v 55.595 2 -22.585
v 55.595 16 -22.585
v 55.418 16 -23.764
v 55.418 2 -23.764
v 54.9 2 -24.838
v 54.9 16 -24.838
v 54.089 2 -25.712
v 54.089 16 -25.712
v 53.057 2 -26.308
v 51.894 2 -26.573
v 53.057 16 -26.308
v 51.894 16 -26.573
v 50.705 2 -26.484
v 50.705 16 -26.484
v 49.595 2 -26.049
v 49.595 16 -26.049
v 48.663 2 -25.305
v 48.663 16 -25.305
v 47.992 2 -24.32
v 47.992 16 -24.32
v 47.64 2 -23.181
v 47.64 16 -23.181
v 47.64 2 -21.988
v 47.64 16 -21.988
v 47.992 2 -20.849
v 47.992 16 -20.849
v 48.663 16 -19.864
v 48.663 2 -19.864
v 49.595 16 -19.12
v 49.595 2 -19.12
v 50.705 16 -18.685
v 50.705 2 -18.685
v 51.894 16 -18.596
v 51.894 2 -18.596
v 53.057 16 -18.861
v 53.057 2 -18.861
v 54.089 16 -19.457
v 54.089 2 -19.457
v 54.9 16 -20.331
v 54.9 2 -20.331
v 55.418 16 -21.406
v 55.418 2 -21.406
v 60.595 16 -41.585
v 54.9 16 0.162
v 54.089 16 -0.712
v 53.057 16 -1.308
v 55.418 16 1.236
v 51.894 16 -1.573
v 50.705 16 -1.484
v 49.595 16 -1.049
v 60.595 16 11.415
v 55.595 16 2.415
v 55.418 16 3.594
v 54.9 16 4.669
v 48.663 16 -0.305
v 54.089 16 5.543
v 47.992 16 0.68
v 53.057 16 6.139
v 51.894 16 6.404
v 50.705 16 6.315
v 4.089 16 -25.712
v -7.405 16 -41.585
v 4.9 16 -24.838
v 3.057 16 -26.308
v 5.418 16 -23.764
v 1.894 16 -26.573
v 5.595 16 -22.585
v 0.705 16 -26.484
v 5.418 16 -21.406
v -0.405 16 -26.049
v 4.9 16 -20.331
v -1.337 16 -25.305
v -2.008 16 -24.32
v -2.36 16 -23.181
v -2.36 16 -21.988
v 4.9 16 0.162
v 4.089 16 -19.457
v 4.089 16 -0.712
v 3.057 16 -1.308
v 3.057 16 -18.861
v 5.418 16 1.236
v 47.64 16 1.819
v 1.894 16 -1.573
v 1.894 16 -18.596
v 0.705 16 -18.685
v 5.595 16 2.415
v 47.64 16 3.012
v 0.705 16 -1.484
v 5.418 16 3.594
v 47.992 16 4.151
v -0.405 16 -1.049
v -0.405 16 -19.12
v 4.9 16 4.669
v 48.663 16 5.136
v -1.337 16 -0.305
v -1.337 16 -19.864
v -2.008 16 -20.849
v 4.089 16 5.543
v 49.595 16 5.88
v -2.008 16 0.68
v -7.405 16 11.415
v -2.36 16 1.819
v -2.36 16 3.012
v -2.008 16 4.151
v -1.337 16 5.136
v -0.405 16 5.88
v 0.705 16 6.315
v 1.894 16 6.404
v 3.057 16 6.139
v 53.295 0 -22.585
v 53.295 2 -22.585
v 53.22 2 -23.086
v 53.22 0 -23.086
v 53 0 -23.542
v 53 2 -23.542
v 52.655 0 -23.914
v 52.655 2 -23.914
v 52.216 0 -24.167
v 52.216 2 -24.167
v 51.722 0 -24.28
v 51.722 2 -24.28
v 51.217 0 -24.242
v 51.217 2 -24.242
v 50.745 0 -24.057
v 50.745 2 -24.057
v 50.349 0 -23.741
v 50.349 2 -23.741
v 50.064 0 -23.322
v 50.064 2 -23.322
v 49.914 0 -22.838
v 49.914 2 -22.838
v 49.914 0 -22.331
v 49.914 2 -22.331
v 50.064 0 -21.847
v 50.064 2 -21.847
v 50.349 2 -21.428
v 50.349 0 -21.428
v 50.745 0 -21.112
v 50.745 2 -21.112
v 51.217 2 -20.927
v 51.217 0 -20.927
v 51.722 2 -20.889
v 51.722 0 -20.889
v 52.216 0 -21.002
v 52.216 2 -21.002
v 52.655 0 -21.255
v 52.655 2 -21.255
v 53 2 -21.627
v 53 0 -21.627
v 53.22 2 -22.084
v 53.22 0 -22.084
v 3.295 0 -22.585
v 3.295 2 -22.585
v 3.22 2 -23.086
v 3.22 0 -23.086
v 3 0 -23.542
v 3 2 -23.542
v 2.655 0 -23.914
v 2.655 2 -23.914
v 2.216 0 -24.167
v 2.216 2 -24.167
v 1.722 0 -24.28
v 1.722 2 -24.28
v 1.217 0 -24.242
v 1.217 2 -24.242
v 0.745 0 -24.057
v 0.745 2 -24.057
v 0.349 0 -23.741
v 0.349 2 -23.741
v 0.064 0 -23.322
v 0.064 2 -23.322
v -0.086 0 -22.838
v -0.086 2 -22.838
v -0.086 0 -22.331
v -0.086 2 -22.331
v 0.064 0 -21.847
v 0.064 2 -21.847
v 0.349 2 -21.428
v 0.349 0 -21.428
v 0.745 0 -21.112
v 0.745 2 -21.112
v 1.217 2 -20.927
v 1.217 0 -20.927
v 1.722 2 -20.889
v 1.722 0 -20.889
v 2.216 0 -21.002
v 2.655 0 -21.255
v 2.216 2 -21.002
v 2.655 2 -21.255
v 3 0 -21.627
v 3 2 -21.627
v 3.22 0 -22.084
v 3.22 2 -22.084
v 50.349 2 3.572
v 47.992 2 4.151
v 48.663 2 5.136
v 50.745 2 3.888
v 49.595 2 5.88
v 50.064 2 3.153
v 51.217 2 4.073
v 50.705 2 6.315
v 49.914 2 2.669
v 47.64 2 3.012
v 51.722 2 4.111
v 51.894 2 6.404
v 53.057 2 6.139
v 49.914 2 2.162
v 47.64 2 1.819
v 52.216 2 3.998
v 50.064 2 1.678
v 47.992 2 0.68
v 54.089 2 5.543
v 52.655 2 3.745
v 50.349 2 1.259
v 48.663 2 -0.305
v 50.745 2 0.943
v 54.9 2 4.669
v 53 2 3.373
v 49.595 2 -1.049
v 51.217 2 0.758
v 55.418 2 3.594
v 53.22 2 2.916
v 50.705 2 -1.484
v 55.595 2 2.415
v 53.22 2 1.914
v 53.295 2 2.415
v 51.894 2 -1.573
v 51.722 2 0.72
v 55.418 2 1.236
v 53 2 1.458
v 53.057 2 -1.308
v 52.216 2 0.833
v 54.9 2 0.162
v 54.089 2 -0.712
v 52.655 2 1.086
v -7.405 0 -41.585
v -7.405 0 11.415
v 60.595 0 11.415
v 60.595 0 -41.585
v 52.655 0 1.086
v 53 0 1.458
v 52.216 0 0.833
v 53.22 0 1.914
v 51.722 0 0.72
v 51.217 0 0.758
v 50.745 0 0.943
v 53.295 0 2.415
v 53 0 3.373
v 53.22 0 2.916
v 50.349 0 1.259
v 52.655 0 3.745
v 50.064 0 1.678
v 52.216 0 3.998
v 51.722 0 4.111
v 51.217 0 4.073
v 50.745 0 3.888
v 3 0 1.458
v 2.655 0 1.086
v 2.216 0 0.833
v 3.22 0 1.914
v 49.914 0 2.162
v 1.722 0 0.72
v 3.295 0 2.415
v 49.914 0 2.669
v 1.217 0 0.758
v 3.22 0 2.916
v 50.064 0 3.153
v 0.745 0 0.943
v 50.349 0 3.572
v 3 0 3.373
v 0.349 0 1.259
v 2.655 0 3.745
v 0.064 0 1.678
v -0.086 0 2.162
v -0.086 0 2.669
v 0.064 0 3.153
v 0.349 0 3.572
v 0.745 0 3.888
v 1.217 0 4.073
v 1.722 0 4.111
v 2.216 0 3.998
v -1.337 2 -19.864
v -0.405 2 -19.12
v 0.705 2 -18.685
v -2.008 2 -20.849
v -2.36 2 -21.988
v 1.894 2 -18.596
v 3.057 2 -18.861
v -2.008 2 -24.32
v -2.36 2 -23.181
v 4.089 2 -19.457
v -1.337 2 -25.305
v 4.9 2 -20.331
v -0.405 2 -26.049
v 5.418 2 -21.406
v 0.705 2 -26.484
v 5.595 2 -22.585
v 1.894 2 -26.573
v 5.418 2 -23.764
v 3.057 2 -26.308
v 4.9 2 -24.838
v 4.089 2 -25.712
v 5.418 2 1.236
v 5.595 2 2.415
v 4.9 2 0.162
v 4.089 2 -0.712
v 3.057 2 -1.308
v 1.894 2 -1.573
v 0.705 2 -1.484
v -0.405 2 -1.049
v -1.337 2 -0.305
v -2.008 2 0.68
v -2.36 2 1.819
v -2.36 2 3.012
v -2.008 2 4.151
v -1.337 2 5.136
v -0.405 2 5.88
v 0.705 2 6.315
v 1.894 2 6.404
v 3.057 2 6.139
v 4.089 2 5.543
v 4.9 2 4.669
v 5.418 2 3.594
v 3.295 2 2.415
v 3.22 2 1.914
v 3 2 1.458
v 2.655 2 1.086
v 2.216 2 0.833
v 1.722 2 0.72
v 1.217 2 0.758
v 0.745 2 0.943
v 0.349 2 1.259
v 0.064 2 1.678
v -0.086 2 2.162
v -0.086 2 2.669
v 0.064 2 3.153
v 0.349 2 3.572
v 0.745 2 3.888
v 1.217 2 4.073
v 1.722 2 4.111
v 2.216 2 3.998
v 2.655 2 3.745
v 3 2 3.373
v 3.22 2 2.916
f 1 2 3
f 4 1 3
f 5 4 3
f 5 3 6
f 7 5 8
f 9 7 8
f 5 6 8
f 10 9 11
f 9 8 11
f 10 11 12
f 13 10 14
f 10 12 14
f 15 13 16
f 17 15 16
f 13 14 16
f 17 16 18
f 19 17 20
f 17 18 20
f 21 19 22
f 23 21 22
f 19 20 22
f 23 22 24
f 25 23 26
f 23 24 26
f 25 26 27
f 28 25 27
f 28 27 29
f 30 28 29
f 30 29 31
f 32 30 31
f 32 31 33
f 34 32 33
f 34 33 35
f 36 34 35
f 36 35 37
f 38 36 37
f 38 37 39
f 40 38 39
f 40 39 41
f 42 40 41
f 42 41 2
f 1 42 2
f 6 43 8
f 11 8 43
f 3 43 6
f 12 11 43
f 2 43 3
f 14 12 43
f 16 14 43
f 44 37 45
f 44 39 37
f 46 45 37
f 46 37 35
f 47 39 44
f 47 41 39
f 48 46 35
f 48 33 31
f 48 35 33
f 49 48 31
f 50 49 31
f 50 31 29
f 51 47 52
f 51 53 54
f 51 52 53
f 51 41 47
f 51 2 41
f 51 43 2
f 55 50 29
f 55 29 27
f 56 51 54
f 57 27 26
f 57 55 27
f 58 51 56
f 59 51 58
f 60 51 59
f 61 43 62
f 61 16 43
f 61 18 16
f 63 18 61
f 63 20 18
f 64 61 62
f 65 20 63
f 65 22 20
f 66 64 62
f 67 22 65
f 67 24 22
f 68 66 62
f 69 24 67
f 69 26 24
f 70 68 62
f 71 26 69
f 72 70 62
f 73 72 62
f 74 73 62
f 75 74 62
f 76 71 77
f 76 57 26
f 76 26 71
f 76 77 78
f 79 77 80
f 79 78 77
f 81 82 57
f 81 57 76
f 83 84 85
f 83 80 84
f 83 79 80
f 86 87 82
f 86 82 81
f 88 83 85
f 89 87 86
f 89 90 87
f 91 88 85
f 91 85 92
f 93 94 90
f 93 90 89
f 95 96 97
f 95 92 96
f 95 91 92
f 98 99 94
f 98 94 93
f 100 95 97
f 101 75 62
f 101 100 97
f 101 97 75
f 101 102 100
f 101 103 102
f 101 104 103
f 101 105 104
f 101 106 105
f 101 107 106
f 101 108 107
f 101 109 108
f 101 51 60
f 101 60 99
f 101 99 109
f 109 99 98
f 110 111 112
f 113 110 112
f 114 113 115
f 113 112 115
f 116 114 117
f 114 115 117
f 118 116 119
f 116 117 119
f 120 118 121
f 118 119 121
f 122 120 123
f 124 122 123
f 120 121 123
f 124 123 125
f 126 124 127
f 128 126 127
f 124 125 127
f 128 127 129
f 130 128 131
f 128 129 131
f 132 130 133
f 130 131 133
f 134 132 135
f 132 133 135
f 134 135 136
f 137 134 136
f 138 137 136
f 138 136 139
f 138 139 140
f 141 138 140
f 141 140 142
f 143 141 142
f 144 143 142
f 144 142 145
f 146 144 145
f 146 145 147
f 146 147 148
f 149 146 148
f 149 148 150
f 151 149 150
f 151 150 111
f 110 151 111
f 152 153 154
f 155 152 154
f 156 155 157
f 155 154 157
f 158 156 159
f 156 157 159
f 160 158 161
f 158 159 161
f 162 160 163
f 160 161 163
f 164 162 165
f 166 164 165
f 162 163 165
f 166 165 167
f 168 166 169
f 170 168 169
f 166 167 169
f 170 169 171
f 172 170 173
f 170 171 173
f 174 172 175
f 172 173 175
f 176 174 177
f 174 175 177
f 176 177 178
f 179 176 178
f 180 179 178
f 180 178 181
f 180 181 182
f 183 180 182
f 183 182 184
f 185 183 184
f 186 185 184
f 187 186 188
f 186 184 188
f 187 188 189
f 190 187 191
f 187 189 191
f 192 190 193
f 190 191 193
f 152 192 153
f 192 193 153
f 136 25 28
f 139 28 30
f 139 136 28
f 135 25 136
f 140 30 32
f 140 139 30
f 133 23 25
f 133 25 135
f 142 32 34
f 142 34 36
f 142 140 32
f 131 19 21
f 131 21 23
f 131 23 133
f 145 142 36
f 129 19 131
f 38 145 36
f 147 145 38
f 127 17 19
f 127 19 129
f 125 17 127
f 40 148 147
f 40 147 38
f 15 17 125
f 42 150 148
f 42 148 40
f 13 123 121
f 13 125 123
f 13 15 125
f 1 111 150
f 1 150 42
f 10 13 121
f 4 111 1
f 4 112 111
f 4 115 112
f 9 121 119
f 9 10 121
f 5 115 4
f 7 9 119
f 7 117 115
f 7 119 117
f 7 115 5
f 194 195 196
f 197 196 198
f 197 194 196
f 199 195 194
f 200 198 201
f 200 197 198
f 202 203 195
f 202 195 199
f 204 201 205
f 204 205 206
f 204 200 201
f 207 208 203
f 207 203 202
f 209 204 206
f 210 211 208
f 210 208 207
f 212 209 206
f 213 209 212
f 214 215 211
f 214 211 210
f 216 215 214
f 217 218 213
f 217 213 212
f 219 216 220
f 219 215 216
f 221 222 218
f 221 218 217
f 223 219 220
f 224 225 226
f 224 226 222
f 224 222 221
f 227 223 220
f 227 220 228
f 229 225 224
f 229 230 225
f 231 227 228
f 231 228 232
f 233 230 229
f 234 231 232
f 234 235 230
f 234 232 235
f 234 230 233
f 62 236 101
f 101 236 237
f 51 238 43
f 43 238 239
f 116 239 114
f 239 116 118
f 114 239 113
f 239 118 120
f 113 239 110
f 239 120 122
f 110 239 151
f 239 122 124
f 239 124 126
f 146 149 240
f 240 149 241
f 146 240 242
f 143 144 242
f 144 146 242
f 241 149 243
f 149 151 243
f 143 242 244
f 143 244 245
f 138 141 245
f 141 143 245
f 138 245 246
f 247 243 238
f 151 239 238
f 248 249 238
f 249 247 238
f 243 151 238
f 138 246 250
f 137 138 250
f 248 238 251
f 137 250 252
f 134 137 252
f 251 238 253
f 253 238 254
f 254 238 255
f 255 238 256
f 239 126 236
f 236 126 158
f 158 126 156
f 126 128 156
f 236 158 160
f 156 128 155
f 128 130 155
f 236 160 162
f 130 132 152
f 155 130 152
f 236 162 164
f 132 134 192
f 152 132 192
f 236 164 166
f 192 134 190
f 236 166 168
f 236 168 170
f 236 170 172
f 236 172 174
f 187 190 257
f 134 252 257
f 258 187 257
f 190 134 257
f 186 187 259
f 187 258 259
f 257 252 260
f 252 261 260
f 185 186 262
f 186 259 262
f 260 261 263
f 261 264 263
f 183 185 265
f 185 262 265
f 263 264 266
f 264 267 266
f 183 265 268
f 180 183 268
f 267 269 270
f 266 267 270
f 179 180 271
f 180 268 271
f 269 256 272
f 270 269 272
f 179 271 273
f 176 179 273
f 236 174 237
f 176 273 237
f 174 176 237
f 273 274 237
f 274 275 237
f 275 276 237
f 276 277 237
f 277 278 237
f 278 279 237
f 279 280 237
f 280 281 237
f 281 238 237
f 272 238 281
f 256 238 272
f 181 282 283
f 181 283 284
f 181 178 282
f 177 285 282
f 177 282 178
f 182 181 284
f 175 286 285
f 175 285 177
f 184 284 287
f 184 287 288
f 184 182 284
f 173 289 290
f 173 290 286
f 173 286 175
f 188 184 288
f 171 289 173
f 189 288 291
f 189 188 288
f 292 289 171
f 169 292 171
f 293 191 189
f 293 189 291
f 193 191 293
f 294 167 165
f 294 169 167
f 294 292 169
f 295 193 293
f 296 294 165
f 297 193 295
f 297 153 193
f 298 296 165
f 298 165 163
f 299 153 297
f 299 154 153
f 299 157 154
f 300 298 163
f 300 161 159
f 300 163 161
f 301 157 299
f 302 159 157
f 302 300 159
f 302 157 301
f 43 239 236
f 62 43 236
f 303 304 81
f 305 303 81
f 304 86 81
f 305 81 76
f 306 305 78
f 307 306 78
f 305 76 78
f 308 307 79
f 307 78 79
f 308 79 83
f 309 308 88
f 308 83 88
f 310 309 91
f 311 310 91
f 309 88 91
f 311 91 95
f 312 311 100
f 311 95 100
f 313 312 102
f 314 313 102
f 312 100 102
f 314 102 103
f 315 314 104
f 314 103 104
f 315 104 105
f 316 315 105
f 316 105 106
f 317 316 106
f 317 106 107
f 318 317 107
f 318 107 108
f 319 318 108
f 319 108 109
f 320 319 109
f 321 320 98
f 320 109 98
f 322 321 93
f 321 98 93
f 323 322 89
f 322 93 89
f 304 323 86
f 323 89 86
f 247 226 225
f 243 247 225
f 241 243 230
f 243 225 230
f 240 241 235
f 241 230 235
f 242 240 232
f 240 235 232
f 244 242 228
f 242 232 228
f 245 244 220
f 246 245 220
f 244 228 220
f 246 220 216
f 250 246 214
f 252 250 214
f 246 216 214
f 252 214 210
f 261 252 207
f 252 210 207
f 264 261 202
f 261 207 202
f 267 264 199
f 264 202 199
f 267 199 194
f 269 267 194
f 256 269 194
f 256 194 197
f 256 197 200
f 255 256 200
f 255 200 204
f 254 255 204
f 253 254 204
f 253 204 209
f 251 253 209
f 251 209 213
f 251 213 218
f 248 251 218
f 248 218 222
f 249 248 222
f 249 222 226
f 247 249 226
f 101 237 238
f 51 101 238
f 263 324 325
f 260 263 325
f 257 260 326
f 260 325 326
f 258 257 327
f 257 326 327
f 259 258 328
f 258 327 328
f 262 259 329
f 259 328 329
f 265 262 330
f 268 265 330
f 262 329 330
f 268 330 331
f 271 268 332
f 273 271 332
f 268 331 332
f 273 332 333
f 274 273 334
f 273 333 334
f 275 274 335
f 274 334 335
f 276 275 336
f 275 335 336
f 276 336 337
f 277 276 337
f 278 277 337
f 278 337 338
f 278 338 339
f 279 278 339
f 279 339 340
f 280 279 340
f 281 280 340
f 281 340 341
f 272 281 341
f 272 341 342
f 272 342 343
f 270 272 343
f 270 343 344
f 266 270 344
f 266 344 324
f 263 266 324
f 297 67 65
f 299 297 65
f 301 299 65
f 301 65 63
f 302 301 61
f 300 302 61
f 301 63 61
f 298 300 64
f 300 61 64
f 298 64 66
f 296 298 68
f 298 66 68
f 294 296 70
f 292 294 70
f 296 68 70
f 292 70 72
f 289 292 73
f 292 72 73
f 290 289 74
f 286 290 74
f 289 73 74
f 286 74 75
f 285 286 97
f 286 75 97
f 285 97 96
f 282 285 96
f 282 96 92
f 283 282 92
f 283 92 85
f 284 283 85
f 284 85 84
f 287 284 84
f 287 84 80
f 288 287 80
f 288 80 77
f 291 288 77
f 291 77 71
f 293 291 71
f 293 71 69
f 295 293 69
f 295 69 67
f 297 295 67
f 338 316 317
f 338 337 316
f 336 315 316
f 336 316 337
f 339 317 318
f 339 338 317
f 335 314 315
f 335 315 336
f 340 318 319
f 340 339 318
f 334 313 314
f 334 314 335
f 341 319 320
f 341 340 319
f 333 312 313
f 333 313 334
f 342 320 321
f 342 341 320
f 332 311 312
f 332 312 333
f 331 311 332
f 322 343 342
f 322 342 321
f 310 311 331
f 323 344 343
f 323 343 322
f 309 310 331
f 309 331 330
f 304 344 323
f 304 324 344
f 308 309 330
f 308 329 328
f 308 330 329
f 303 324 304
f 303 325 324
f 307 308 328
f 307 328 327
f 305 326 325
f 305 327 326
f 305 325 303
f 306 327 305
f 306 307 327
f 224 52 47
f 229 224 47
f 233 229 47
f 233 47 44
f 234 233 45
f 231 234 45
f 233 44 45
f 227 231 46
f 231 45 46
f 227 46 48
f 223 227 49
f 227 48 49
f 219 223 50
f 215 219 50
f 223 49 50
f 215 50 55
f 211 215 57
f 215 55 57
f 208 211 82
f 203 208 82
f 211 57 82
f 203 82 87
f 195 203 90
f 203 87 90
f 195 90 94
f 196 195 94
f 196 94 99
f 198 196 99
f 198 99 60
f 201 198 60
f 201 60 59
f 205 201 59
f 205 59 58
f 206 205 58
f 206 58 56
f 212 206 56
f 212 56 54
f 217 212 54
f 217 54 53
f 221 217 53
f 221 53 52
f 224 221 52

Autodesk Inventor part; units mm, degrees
ref_plane "YZ Plane" through (0, 0, 0) normal (1, 0, 0) x (0, 1, 0)
ref_plane "XZ Plane" through (0, 0, 0) normal (0, 1, 0) x (-1, 0, 0)
ref_plane "XY Plane" through (0, 0, 0) normal (0, 0, 1) x (1, 0, 0)
sketch "Sketch1" plane through (0, 0, 0) normal (0, 1, 0) x (-1, 0, 0)
  line L0 (7.4046, 11.4154) -> (-60.5954, 11.4154)
  line L1 (-60.5954, 11.4154) -> (-60.5954, -41.5846)
  line L2 (-60.5954, -41.5846) -> (7.4046, -41.5846)
  line L3 (7.4046, -41.5846) -> (7.4046, 11.4154)
  point P0 (0, 0)
  dimension "d0" = 68
  dimension "d1" = 53
extrude "Extrusion1" add sketch "Sketch1" along normal blind 16
sketch "Sketch2" plane through (0, 16, 0) normal (0, 1, 0) x (1, 0, 0)
  circle A0 centre (1.5954, -2.4154) radius 4
  circle A1 centre (1.5954, 22.5846) radius 4
  circle A2 centre (51.5954, 22.5846) radius 4
  circle A3 centre (51.5954, -2.4154) radius 4
  line L0 (-7.4046, 41.5846) -> (-7.4046, -11.4154) projected
  line L1 (-7.4046, -11.4154) -> (60.5954, -11.4154) projected
  point P0 (0, 0)
  dimension "d4" = 8
  dimension "d5" = 8
  dimension "d6" = 8
  dimension "d7" = 8
  dimension "d8" = 50
  dimension "d9" = 25
  dimension "d10" = 9
  dimension "d11" = 9
extrude "Extrusion2" cut sketch "Sketch2" against normal blind 14
sketch "Sketch3" plane through (1.5954, 2, 2.4154) normal (0, 1, 0) x (1, 0, 0)
  circle A0 centre (0, 0) radius 4 projected
  circle A1 centre (0, 0) radius 1.7
  circle A2 centre (0, 25) radius 4 projected
  circle A3 centre (0, 25) radius 1.7
  circle A4 centre (50, 25) radius 4 projected
  circle A5 centre (50, 25) radius 1.7
  circle A6 centre (50, 0) radius 4 projected
  circle A7 centre (50, 0) radius 1.7
  point P0 (-1.5954, 2.4154)
  dimension "d14" = 3.4
  dimension "d15" = 3.4
  dimension "d16" = 3.4
  dimension "d17" = 3.4
extrude "Extrusion3" cut sketch "Sketch3" against normal through all contours A1 | A3 | A5 | A7
properties part number "bottomMotorMount"
